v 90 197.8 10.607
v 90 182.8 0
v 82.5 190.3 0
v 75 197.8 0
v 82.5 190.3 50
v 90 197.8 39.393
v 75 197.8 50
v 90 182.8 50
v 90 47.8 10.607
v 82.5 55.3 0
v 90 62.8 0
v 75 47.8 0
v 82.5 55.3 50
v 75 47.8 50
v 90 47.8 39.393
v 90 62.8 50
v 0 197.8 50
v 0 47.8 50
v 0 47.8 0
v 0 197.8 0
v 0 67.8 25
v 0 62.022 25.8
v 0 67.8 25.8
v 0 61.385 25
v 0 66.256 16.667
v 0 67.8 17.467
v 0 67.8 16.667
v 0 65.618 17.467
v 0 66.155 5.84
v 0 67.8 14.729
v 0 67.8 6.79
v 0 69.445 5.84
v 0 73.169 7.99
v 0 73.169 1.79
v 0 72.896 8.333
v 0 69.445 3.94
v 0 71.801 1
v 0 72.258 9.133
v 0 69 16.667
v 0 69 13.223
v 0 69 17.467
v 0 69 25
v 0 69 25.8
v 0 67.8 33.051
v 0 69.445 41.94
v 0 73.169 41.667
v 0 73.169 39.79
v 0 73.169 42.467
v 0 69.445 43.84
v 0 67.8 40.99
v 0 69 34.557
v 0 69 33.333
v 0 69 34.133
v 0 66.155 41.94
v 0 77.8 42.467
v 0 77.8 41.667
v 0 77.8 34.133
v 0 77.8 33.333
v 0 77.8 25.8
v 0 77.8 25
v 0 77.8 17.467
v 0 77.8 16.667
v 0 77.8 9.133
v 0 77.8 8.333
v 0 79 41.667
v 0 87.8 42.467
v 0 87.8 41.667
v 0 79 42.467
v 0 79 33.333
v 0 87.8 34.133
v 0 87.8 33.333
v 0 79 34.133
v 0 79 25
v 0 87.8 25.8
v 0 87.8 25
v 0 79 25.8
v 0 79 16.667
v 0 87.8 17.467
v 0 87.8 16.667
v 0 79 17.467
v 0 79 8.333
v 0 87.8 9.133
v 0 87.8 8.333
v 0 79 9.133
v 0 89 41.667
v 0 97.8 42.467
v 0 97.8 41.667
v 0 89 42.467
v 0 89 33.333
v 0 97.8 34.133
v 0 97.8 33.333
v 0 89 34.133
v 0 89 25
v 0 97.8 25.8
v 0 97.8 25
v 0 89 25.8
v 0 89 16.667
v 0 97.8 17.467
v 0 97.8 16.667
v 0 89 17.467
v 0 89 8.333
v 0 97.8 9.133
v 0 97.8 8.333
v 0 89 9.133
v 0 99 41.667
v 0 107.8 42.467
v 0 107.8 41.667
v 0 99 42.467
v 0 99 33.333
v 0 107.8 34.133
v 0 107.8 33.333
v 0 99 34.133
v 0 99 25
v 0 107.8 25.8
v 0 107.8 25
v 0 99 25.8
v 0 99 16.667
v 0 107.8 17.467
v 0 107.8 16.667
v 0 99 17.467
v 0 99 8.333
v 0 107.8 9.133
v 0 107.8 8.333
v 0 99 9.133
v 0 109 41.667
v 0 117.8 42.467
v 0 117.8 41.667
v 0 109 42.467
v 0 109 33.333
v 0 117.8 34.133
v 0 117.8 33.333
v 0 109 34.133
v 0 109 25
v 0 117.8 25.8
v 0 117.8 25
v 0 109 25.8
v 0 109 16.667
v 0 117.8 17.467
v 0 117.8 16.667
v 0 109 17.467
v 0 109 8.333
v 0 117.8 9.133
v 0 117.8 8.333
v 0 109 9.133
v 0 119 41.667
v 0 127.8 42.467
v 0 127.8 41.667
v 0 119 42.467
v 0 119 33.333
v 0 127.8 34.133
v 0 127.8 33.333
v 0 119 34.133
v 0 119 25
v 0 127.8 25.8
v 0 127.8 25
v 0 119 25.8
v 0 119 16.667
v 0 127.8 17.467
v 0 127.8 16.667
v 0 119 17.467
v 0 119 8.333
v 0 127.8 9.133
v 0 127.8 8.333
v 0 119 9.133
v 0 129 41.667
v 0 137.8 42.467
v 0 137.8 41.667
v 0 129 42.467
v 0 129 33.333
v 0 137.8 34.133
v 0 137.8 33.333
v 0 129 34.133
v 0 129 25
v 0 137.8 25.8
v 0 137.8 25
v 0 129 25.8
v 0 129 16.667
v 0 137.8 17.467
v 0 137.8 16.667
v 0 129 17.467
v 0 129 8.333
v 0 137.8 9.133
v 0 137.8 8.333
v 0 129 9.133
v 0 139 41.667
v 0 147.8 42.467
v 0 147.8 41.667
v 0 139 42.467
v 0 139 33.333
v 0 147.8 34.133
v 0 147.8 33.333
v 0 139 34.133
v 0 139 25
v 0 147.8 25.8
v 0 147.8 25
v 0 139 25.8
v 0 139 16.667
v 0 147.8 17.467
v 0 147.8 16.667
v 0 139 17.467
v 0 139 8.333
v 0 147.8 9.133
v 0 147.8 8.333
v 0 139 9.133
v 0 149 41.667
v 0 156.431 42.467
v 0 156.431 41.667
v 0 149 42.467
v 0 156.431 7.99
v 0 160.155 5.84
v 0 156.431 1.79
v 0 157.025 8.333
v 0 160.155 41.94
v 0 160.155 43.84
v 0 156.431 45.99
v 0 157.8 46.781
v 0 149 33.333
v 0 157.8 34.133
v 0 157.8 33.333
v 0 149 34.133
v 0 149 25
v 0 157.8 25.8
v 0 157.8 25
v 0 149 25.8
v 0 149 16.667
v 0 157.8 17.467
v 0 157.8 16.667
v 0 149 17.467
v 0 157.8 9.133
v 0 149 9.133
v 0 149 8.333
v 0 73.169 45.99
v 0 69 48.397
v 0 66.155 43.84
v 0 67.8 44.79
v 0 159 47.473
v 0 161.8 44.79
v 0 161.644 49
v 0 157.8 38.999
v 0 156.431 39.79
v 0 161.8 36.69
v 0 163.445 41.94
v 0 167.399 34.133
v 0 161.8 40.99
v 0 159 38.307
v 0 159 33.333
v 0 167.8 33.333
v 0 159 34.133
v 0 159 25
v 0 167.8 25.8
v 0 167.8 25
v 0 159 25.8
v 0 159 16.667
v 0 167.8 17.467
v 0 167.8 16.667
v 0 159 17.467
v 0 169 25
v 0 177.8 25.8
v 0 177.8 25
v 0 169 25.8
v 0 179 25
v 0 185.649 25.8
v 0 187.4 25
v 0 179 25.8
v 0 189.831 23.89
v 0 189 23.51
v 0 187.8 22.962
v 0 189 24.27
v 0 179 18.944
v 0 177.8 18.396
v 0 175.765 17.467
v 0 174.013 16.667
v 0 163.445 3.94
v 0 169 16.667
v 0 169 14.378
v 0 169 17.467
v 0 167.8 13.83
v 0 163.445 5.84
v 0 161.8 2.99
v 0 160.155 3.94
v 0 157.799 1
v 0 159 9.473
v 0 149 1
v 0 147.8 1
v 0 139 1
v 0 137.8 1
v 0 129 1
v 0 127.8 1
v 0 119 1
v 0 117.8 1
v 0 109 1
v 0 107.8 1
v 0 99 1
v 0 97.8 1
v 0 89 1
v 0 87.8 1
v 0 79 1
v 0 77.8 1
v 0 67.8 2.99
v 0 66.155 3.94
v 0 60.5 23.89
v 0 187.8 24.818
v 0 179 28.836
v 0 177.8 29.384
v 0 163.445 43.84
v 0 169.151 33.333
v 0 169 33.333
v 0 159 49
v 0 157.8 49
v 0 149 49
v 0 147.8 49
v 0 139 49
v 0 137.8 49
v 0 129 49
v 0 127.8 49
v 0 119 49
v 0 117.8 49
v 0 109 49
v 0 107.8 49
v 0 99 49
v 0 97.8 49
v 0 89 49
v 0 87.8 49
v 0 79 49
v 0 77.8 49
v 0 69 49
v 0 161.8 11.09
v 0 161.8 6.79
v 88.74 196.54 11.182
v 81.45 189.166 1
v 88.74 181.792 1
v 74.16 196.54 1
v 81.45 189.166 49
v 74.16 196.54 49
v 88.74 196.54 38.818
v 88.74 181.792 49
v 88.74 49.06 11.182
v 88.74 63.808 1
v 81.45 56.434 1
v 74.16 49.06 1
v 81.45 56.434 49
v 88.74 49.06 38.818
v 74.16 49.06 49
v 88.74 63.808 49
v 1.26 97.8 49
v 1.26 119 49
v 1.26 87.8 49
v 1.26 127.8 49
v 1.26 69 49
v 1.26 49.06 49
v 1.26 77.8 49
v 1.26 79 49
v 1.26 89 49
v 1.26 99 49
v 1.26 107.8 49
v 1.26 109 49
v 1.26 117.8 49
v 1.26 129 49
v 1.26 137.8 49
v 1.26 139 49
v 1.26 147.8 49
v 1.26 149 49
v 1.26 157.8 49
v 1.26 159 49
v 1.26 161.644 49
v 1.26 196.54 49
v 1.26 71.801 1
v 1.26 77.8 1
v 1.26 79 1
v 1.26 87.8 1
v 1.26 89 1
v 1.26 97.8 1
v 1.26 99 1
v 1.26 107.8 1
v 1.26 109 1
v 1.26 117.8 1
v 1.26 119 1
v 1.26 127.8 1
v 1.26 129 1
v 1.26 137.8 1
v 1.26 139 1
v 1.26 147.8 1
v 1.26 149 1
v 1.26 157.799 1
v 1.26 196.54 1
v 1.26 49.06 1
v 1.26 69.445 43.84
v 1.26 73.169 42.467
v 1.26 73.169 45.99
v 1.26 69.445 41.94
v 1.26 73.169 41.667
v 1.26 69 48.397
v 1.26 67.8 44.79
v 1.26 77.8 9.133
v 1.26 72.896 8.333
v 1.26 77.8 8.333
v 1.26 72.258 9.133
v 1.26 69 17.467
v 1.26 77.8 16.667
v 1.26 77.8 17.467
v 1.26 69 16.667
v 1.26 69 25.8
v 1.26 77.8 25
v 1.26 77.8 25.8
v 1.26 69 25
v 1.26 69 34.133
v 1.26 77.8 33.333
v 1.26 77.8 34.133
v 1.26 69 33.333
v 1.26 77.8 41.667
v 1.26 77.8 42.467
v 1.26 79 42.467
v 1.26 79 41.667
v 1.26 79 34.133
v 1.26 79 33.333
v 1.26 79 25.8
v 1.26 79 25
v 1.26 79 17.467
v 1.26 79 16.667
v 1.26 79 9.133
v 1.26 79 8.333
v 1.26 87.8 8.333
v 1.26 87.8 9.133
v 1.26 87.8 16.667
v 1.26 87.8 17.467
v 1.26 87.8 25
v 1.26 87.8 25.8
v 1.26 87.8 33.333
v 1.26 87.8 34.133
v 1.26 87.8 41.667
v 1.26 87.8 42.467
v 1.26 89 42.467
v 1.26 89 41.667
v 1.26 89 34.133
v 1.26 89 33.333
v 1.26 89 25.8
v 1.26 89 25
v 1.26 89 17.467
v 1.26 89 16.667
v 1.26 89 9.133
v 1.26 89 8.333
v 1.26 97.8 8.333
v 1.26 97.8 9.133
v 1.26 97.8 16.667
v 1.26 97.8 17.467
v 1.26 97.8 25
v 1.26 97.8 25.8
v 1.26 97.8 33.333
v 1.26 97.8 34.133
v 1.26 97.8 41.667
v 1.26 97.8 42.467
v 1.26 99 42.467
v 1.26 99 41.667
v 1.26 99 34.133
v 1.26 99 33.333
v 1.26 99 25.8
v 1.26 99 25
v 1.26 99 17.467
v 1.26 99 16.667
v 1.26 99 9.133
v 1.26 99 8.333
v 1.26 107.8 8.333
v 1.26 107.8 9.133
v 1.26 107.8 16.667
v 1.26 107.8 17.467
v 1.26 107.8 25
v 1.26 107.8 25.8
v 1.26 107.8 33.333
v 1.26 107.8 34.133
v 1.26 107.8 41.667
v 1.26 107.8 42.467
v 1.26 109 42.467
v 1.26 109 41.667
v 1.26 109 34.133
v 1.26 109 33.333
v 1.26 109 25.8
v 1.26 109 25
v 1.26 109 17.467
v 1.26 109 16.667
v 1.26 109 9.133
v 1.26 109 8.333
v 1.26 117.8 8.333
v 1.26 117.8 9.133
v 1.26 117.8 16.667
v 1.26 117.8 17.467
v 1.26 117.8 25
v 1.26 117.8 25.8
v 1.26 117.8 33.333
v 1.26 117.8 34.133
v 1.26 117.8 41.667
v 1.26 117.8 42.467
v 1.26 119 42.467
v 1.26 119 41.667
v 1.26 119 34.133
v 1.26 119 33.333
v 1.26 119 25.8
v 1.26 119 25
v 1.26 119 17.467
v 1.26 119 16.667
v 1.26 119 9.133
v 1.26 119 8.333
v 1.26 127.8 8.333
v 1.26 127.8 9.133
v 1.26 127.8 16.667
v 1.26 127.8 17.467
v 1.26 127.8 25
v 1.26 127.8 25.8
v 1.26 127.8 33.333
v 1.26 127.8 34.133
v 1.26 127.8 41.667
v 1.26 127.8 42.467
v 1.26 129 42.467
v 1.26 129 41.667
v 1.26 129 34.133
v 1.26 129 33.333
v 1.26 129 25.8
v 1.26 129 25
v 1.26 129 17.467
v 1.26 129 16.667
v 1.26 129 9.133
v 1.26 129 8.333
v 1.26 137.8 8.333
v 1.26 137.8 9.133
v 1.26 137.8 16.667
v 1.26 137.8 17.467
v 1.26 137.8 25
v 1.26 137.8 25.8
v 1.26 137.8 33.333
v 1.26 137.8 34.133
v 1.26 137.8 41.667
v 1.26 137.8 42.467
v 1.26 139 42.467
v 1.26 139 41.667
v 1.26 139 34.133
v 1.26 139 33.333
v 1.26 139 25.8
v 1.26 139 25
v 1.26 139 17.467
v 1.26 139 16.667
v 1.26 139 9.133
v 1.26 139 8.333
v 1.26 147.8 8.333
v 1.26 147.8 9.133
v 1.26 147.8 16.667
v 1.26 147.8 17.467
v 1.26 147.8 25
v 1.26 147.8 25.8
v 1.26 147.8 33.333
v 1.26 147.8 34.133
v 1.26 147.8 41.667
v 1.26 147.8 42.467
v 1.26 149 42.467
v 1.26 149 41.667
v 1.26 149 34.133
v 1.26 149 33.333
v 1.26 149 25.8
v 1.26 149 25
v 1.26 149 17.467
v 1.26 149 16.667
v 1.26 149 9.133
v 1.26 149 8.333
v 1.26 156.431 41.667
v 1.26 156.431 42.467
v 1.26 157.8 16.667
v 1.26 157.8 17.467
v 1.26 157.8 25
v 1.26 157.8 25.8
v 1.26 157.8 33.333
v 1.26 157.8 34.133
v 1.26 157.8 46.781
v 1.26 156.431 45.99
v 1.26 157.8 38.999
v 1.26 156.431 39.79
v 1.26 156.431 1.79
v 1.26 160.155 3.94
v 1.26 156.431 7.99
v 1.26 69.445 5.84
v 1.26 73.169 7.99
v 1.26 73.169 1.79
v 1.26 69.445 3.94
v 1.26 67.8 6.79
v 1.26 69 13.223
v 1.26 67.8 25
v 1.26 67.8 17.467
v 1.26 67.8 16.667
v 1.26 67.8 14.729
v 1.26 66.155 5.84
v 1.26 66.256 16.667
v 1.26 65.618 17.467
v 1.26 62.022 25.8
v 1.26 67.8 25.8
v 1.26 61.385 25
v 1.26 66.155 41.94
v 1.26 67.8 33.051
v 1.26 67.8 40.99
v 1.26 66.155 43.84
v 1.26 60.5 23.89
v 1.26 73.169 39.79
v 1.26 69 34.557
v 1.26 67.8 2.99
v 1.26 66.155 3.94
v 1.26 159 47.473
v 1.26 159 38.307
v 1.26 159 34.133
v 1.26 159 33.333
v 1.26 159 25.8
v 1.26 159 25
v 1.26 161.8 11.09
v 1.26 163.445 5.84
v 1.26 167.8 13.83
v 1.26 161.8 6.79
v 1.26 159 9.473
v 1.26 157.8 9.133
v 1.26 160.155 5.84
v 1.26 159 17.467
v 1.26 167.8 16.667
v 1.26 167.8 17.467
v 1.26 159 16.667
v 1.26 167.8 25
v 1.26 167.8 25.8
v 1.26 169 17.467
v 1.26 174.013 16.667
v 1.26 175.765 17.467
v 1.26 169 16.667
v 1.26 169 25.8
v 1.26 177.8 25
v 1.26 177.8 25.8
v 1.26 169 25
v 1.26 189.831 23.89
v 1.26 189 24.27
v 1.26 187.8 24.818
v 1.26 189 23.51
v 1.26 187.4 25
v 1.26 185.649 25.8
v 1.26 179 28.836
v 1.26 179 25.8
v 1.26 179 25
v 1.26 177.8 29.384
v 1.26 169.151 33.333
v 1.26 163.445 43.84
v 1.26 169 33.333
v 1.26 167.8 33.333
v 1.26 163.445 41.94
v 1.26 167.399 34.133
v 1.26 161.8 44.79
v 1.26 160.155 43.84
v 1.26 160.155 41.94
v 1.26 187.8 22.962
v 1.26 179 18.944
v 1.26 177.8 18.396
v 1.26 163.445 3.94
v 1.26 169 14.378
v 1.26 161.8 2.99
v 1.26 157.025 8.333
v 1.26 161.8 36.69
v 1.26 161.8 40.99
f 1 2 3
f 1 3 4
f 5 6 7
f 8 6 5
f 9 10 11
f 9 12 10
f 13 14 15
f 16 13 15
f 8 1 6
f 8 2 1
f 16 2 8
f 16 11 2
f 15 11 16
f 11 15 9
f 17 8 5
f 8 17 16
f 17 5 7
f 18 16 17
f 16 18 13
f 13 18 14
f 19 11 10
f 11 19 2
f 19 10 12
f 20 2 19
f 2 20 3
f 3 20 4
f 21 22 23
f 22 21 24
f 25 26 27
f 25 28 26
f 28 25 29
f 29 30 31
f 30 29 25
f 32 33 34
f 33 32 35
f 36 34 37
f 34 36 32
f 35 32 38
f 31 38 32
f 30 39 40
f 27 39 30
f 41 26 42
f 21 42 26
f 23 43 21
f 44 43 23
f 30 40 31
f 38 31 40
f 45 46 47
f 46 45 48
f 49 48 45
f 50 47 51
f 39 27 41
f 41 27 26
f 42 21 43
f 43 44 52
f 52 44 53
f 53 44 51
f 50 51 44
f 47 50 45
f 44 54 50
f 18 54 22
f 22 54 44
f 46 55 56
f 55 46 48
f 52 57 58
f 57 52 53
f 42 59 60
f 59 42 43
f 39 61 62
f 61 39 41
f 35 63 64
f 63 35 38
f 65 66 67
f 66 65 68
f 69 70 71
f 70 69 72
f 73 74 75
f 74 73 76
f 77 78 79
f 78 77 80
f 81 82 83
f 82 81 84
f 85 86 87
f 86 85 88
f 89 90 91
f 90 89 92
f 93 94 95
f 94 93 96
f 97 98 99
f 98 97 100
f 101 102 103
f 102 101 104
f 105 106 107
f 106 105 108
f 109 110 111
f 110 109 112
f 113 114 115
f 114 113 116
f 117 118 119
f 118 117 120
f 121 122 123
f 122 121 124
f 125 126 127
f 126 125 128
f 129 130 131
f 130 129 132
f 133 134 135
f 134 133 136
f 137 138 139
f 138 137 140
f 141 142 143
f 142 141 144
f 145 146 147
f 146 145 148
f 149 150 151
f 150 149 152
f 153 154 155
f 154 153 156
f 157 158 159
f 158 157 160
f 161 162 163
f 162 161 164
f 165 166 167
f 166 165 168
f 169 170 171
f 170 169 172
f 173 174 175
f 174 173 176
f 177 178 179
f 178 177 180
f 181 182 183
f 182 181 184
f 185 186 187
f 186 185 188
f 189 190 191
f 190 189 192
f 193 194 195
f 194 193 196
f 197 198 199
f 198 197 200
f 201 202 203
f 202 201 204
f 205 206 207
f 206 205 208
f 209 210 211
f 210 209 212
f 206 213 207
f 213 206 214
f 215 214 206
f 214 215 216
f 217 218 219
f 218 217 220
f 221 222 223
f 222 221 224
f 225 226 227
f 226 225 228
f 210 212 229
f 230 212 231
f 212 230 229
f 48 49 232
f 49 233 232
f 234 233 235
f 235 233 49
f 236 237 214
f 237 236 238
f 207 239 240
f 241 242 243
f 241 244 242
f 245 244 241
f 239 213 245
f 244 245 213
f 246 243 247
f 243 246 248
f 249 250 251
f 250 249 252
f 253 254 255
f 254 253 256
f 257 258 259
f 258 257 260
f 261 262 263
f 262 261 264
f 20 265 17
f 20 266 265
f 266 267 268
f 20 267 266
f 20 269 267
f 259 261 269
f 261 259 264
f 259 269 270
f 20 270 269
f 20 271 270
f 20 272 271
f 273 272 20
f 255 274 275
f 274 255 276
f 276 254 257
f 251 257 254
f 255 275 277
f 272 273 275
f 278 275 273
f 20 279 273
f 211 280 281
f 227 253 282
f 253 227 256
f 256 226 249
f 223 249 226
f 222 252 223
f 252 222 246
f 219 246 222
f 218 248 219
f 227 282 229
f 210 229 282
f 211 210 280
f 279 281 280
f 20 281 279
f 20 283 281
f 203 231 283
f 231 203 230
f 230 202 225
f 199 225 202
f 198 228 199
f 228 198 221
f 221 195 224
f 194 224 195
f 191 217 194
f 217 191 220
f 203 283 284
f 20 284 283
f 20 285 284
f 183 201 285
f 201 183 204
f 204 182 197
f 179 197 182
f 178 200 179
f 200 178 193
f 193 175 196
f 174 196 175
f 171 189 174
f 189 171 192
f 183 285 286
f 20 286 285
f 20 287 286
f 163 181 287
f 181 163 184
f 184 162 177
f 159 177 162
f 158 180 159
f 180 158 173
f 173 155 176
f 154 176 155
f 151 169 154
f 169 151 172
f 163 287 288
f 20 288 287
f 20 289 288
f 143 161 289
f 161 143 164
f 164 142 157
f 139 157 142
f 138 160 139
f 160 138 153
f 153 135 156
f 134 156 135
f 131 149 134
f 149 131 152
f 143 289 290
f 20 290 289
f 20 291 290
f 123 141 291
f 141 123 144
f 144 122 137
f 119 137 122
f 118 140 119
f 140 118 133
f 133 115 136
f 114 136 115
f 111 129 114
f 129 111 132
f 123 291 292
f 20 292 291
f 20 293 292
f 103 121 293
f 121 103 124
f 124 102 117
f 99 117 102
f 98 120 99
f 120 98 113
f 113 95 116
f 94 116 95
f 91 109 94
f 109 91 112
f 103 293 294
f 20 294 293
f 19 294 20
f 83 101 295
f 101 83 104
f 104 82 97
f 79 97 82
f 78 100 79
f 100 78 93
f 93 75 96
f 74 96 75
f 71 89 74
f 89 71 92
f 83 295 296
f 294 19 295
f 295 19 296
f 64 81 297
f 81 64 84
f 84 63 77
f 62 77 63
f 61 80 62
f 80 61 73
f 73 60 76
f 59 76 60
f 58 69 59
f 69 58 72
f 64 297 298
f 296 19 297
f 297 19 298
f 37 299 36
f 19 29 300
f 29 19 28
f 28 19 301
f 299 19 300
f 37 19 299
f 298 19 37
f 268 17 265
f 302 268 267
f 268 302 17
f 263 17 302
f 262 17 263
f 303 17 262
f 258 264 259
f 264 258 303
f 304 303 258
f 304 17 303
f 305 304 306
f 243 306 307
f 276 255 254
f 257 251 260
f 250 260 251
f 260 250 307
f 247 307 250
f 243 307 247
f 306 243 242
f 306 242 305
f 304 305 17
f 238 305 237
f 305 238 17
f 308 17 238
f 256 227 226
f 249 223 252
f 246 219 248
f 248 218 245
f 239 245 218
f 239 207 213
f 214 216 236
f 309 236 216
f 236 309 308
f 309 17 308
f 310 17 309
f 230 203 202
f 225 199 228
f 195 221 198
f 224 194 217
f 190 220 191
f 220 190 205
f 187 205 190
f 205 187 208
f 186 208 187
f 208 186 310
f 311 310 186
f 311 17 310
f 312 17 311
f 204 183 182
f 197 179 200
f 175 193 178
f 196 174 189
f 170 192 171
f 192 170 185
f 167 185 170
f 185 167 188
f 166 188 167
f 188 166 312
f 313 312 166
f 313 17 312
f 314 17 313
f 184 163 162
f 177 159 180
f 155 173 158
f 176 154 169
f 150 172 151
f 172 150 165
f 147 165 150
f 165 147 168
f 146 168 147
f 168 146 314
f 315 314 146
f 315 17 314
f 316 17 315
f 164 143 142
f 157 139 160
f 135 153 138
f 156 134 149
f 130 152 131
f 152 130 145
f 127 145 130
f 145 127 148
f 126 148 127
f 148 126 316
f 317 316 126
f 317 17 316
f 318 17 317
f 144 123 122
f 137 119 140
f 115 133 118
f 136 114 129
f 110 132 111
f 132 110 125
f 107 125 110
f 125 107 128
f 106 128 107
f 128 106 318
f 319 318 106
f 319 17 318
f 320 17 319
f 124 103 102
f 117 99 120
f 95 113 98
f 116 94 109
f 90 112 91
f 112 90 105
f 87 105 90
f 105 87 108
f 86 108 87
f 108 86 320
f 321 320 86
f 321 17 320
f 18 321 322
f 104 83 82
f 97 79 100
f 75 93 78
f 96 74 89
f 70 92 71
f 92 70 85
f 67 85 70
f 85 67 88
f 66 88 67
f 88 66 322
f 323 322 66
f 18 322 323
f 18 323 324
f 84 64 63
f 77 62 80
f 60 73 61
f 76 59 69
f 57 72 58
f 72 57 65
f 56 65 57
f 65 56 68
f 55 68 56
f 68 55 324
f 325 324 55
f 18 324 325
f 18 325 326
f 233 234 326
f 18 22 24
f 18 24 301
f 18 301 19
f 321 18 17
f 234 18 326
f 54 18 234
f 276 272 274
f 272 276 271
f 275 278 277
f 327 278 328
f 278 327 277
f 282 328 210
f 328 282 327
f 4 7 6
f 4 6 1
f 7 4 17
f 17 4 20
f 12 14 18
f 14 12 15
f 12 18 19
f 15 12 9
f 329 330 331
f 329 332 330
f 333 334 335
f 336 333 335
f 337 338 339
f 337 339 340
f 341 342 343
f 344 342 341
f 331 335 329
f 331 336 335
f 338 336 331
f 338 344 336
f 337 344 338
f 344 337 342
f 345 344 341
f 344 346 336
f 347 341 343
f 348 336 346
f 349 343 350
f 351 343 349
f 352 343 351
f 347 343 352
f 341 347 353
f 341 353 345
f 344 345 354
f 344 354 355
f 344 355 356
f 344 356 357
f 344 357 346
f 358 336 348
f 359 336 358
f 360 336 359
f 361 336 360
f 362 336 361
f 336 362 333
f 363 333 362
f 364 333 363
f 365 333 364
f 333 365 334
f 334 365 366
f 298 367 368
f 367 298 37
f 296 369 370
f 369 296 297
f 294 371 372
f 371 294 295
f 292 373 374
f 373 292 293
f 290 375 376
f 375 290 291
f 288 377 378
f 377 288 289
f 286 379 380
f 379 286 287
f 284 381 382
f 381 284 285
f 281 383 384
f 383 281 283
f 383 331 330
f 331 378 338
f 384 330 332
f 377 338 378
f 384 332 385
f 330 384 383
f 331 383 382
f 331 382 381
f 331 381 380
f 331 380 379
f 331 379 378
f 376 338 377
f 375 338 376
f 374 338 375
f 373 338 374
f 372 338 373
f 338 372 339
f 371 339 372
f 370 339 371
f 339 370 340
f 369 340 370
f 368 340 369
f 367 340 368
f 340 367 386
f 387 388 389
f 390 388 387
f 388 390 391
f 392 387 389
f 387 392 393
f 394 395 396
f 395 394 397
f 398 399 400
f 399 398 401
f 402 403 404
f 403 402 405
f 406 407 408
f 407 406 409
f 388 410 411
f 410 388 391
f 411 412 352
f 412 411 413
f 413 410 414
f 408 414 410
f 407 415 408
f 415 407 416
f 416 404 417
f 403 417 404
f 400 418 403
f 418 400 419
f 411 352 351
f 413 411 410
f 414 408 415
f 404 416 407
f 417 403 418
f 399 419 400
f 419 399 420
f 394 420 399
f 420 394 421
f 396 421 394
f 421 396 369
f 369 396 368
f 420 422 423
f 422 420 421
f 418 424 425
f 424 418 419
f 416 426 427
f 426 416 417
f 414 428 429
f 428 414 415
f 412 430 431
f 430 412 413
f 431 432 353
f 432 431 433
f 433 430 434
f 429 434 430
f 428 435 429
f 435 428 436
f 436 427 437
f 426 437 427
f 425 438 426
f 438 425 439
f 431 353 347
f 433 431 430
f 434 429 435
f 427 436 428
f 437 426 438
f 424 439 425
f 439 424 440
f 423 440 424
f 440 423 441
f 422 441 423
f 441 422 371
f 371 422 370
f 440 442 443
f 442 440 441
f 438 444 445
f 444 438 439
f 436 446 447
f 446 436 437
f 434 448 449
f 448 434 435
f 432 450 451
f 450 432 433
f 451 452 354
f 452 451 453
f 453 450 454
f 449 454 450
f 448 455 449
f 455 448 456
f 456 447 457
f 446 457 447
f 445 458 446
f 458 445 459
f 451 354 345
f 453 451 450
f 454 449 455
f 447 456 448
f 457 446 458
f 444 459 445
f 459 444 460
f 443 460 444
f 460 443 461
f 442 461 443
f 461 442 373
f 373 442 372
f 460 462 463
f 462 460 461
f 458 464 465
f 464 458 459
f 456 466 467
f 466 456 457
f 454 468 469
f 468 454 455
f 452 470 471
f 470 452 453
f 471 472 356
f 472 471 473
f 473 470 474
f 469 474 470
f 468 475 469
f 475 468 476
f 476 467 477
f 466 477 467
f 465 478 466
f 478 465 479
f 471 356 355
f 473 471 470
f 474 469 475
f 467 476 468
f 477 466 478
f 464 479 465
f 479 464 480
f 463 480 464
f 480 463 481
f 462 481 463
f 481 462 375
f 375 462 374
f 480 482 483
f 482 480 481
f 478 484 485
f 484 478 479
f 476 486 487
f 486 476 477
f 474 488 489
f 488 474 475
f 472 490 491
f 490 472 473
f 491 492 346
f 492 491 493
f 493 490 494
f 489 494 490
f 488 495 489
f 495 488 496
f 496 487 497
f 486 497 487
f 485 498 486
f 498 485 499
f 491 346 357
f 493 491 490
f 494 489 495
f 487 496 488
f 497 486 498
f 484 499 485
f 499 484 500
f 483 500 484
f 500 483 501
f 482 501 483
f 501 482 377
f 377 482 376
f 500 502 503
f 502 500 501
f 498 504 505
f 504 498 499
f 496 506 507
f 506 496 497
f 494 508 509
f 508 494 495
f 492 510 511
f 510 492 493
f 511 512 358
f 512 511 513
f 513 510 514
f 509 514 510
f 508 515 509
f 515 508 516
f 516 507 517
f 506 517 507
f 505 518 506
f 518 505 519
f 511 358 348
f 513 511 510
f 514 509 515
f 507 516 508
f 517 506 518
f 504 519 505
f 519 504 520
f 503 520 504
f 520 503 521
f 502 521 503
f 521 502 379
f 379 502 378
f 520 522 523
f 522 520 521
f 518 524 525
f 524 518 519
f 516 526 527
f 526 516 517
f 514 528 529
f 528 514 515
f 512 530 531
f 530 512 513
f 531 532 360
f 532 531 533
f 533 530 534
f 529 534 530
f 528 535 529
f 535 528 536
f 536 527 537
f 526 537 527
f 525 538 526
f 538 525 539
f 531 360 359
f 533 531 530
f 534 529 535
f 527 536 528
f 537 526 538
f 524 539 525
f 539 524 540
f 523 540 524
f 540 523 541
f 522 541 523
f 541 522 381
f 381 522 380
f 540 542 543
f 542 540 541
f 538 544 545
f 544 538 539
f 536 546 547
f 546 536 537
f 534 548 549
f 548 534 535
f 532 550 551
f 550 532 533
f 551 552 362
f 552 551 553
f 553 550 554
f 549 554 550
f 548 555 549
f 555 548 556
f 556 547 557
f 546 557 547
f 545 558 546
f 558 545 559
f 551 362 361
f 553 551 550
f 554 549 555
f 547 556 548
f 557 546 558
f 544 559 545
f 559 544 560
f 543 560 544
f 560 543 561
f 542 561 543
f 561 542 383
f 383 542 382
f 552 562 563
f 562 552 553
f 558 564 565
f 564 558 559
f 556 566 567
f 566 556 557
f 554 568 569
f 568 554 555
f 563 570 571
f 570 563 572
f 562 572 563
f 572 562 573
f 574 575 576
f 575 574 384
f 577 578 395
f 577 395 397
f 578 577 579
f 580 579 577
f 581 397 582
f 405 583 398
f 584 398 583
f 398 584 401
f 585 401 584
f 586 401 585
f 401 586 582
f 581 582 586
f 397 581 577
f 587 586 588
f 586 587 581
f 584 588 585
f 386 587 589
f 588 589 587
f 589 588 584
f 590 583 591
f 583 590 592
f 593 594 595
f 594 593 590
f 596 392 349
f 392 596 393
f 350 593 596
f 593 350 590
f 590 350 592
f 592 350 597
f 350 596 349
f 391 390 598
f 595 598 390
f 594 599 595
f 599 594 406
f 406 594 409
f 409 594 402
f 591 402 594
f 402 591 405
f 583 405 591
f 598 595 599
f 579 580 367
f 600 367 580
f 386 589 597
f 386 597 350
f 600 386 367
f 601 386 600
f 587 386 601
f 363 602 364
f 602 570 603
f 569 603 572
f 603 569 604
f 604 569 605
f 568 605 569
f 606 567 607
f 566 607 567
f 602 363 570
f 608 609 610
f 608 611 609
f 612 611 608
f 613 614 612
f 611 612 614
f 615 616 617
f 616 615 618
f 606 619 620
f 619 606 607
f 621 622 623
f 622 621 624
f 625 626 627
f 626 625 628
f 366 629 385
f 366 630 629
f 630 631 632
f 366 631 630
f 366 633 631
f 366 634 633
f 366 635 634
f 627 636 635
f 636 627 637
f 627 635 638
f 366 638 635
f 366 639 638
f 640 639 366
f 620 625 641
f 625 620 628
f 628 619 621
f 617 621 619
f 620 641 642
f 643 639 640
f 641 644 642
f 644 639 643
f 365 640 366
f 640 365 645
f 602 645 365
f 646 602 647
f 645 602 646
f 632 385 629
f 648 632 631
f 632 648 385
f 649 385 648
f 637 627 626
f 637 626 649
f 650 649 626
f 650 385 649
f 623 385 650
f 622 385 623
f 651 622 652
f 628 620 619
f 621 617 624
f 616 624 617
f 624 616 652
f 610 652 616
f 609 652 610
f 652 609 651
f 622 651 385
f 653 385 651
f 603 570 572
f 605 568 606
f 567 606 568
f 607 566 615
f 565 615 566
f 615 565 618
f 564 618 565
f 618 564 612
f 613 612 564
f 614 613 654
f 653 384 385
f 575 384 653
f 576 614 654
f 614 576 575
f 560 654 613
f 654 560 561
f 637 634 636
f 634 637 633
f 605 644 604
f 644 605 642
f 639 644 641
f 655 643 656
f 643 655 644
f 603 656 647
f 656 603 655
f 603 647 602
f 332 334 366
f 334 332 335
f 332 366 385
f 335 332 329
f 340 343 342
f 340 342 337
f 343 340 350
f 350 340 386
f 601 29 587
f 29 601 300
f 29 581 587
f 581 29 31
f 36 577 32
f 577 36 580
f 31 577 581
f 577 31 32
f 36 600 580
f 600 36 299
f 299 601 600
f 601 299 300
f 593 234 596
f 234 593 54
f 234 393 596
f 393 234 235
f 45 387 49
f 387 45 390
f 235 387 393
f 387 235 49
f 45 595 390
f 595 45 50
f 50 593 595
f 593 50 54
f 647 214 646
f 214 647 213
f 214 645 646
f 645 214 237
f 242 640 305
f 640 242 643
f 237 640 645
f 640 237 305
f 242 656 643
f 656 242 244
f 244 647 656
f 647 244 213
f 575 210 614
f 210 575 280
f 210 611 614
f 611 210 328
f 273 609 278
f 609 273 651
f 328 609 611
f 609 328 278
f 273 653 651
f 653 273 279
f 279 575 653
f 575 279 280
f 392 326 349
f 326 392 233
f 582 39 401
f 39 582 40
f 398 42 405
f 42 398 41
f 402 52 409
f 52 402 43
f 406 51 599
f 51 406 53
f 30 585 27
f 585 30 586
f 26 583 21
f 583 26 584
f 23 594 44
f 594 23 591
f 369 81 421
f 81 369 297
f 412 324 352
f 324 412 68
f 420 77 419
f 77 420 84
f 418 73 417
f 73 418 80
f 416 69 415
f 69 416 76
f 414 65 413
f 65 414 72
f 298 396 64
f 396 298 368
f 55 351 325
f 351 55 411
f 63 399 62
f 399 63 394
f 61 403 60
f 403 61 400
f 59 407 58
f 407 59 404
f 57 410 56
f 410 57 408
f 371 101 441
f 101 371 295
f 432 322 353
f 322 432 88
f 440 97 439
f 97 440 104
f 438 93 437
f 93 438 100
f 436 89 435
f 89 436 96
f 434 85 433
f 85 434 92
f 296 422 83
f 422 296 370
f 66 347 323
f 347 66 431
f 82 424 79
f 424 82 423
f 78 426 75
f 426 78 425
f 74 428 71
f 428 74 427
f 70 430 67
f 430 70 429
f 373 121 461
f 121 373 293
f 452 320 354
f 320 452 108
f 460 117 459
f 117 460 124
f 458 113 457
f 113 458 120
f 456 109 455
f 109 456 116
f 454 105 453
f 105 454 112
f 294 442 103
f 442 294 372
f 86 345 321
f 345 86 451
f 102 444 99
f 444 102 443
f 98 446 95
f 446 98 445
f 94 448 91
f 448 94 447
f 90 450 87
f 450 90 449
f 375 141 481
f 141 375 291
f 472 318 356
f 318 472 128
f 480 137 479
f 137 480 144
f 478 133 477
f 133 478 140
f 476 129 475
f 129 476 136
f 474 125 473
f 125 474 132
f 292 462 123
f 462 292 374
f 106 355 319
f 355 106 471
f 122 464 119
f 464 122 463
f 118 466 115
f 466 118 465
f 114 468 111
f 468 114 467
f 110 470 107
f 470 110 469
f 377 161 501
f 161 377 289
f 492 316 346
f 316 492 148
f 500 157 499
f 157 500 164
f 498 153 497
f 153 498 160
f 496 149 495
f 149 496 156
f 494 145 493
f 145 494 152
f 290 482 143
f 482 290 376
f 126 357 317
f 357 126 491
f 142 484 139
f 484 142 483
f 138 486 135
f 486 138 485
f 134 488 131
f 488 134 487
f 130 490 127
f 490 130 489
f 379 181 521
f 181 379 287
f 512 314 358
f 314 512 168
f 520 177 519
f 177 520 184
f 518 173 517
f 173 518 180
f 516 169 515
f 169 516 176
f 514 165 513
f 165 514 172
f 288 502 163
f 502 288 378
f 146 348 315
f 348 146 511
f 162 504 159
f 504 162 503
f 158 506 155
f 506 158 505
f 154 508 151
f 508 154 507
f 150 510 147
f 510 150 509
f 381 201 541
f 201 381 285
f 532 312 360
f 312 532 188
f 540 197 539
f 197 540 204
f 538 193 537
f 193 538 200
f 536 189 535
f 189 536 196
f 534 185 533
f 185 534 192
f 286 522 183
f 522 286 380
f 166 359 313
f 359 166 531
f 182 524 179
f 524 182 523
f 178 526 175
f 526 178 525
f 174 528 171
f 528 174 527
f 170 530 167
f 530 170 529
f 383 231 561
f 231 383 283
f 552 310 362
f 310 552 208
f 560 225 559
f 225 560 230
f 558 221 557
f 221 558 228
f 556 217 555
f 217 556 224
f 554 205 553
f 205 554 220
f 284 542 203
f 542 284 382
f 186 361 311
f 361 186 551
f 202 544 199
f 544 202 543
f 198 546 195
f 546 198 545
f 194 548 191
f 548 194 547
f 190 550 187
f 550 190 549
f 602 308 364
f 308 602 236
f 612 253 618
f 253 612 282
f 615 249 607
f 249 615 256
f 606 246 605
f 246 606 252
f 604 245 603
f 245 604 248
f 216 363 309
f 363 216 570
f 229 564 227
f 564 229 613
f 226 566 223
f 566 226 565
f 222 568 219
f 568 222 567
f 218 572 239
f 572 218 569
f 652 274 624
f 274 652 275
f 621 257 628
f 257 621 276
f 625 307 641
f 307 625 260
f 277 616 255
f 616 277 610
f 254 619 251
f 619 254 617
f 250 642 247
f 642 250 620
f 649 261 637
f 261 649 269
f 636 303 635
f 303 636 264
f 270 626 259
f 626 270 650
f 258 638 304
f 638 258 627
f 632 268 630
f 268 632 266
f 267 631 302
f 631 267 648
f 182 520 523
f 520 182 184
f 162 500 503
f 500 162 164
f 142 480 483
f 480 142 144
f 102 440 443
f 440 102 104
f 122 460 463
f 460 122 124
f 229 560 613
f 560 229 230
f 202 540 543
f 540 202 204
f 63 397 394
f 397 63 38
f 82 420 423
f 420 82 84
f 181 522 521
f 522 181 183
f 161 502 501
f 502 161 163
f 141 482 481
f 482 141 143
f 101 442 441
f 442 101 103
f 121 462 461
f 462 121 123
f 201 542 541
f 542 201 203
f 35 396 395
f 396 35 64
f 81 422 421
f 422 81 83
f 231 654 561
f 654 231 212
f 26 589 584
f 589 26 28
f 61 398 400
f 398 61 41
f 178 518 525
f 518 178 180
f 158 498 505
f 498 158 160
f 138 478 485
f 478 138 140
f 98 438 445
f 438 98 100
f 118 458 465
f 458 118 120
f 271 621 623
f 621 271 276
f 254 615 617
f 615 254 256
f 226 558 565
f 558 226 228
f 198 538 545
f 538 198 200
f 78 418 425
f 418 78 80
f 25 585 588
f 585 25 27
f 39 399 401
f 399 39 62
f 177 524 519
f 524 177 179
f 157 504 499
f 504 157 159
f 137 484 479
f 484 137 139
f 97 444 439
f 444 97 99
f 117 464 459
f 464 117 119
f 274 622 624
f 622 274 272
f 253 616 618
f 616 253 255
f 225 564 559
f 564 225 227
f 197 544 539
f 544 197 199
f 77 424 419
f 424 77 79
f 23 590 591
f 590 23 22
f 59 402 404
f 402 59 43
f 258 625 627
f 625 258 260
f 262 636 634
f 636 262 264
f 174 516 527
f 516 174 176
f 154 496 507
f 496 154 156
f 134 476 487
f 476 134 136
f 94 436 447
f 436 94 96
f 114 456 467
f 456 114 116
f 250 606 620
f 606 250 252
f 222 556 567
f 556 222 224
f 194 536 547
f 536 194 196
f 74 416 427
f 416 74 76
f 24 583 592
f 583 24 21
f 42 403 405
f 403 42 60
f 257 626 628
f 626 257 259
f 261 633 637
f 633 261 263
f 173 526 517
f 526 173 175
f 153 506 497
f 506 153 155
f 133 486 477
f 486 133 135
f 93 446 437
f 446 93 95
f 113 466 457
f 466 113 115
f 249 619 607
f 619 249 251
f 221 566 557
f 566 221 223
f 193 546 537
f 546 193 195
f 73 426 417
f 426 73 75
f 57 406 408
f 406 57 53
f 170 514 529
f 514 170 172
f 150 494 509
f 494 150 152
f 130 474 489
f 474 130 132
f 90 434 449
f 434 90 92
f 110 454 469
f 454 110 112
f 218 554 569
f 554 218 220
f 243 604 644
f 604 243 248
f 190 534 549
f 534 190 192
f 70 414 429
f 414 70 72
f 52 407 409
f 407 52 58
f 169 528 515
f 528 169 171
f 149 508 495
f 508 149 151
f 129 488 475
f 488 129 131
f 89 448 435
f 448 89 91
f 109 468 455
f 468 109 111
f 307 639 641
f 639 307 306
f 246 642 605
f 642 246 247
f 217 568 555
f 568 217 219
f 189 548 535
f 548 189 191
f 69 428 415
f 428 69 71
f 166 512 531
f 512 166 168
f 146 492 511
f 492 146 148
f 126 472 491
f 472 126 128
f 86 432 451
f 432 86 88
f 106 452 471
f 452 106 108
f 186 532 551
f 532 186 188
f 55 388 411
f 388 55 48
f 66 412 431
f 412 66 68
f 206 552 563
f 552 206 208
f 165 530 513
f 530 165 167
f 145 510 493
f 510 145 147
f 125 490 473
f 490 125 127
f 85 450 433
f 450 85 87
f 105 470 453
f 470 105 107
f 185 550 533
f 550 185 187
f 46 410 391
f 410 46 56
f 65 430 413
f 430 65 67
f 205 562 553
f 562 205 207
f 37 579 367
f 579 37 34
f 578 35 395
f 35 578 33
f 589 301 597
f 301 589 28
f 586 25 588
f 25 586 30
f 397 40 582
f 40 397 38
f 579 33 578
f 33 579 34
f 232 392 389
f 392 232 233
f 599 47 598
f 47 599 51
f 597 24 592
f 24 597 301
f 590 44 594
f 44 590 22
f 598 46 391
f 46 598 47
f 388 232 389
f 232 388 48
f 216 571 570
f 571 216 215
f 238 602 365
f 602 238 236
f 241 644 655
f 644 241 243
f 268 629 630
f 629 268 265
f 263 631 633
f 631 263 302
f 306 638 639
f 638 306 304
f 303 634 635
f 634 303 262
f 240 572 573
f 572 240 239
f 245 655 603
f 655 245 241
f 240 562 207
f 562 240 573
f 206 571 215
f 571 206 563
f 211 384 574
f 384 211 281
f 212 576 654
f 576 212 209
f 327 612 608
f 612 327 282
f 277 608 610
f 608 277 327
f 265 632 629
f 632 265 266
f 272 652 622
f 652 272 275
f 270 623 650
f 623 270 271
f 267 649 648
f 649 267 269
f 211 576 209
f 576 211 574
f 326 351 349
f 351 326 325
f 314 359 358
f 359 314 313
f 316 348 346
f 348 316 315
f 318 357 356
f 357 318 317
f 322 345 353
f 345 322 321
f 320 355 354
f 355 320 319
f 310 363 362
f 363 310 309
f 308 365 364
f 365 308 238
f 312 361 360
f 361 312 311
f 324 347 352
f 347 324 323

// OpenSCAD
/**
 * Arduino & RAMPS Enclosure for 
 * Prusa i3 Style Frame Printers.
**/

// Used to calculate slew between mating surfaces in the x/y planes.
printer_nozzle_od = 0.4;

// Used to calculate mount hole diameters.
hotend_cable_cross_section = [10.5, 10.5];
heatbed_cable_cross_section = [9.75, 8];

top = 1;
bottom = 1;
wall = 1.26;

// lower left hole located @ 4.89, 67.8 on the frame (from the table)
frame_mount_origin = [4.89, 67.8];

box_origin = [0, frame_mount_origin[1] - 20, 0];
// Outer Dimensions of the box.
box_dimensions = [90, 150, 50];

difference() {
    // Start with the outer box shell.
    translate(box_origin) {
            difference() {
                    outer_box();
                
                // calculate scales for each axis.
                // scale = target * 100 / current_size
                inner_box_dimensions = [
                    box_dimensions[0] - 2 * wall, // 2 walls
                    box_dimensions[1] - 2 * wall, // 2 walls
                    box_dimensions[2] - top - bottom // top and bottom
                ];
                
                // Create the inner hollow...
                difference() {
                    translate([wall, wall, bottom]) 
                        resize(inner_box_dimensions) 
                            outer_box(); 
                    // Create the struts for reinforcements
                    translate([]) cube([]);
                }
        }
    }
    

    // Draw the frame with the mounting screws / nuts.
    i3Frame(frame_width = box_dimensions[2]);
}

module outer_box() {
    difference() {
        cube([box_dimensions[0], box_dimensions[1], box_dimensions[2]]);
        // corner angles
        translate([box_dimensions[0], box_dimensions[1] / 2, box_dimensions[2] / 2]) {
            for (zy = [0, 1]) {
                mirror([0, zy, 0])
                for (zm = [0, 1]) {
                    mirror([0, 0, zm])
                        translate([0, box_dimensions[1] / 2, -box_dimensions[2] / 2])
                            rotate([45, 45, 45]) 
                                cube([15, 30, 30], center = true);
                }
            }
        }
    }
}    


module i3Frame(thickness = 6, frame_width = 50) {
    // Relative to the origin point.
    frame_mount_locations = [
        [0, 0],
        [38, 0],
        [38, 94],
        [0, 94]
    ];
    
    translate([-thickness, -10, 0])
        cube([thickness, box_dimensions[1] + frame_mount_origin[1] + 20, frame_width]);
    
    // M3 Screw posts
    rotate([0, 270, 0]) translate([0, 0, -wall]){
        translate([frame_mount_origin[0], frame_mount_origin[1], 0]) {
            for (screw_coord = frame_mount_locations) {
                // M3 Hex nut & entry
                translate([screw_coord[0], screw_coord[1], -3.4]) {
                    cylinder(d1 = 7.251 + printer_nozzle_od, 
                                 d2 = 6.01 + printer_nozzle_od, 
                                 h = 1, $fn = 6);
                    translate([0, 0, 1]) 
                        cylinder(d = 6.01 + printer_nozzle_od, h = 2.4, $fn = 6);
                    translate([0, 0, 0])
                        cylinder(d = 3.4 + printer_nozzle_od, h = thickness + 3.4);
                }
            }
        }
        
        translate(box_origin) {
            difference() {
                // Hollow the entire back.
                translate([bottom, wall, 0]) cube([box_dimensions[2] - bottom - top, box_dimensions[1] - wall * 2, wall + 3.4]);
                
                // remove some vertical bands to act as print support
                for (vy = [0 : box_dimensions[1] / 15 : box_dimensions[1]]) {
                    translate([0, vy, 0]) cube([box_dimensions[2], printer_nozzle_od * 3, wall + 0.5]);
                }
                
                // And a few horizontal ones too.
                for (i = [0 : 5]) {
                    vz = box_dimensions[2] / 6 * i;
                    translate([vz, 0, 0]) cube([0.8, box_dimensions[1], wall + 0.5]);
                }
        
                translate([frame_mount_origin[0], 20, 0]) {
                    for (screw_coord = frame_mount_locations) {
                        // M3 Hex nut & entry
                        hull() {
                            translate([screw_coord[0], screw_coord[1], 0]) {
                                cylinder(d = 12 + printer_nozzle_od, 
                                             h = wall + 0.5, $fn = 6);
                                translate([screw_coord[0] == 0 ? 25 : -25, 
                                               screw_coord[1] == 0 ? -20 : box_dimensions[1] - screw_coord[1], 0])
                                cylinder(d = 12 + printer_nozzle_od, h = wall + 0.5);
                                translate([0, screw_coord[1] == 0 ? -20 : box_dimensions[1] - screw_coord[1], 0])
                                cylinder(d = 12 + printer_nozzle_od, h = wall + 0.5);
                            }
                        }
                    }
                }
            }
        }
    }
}
